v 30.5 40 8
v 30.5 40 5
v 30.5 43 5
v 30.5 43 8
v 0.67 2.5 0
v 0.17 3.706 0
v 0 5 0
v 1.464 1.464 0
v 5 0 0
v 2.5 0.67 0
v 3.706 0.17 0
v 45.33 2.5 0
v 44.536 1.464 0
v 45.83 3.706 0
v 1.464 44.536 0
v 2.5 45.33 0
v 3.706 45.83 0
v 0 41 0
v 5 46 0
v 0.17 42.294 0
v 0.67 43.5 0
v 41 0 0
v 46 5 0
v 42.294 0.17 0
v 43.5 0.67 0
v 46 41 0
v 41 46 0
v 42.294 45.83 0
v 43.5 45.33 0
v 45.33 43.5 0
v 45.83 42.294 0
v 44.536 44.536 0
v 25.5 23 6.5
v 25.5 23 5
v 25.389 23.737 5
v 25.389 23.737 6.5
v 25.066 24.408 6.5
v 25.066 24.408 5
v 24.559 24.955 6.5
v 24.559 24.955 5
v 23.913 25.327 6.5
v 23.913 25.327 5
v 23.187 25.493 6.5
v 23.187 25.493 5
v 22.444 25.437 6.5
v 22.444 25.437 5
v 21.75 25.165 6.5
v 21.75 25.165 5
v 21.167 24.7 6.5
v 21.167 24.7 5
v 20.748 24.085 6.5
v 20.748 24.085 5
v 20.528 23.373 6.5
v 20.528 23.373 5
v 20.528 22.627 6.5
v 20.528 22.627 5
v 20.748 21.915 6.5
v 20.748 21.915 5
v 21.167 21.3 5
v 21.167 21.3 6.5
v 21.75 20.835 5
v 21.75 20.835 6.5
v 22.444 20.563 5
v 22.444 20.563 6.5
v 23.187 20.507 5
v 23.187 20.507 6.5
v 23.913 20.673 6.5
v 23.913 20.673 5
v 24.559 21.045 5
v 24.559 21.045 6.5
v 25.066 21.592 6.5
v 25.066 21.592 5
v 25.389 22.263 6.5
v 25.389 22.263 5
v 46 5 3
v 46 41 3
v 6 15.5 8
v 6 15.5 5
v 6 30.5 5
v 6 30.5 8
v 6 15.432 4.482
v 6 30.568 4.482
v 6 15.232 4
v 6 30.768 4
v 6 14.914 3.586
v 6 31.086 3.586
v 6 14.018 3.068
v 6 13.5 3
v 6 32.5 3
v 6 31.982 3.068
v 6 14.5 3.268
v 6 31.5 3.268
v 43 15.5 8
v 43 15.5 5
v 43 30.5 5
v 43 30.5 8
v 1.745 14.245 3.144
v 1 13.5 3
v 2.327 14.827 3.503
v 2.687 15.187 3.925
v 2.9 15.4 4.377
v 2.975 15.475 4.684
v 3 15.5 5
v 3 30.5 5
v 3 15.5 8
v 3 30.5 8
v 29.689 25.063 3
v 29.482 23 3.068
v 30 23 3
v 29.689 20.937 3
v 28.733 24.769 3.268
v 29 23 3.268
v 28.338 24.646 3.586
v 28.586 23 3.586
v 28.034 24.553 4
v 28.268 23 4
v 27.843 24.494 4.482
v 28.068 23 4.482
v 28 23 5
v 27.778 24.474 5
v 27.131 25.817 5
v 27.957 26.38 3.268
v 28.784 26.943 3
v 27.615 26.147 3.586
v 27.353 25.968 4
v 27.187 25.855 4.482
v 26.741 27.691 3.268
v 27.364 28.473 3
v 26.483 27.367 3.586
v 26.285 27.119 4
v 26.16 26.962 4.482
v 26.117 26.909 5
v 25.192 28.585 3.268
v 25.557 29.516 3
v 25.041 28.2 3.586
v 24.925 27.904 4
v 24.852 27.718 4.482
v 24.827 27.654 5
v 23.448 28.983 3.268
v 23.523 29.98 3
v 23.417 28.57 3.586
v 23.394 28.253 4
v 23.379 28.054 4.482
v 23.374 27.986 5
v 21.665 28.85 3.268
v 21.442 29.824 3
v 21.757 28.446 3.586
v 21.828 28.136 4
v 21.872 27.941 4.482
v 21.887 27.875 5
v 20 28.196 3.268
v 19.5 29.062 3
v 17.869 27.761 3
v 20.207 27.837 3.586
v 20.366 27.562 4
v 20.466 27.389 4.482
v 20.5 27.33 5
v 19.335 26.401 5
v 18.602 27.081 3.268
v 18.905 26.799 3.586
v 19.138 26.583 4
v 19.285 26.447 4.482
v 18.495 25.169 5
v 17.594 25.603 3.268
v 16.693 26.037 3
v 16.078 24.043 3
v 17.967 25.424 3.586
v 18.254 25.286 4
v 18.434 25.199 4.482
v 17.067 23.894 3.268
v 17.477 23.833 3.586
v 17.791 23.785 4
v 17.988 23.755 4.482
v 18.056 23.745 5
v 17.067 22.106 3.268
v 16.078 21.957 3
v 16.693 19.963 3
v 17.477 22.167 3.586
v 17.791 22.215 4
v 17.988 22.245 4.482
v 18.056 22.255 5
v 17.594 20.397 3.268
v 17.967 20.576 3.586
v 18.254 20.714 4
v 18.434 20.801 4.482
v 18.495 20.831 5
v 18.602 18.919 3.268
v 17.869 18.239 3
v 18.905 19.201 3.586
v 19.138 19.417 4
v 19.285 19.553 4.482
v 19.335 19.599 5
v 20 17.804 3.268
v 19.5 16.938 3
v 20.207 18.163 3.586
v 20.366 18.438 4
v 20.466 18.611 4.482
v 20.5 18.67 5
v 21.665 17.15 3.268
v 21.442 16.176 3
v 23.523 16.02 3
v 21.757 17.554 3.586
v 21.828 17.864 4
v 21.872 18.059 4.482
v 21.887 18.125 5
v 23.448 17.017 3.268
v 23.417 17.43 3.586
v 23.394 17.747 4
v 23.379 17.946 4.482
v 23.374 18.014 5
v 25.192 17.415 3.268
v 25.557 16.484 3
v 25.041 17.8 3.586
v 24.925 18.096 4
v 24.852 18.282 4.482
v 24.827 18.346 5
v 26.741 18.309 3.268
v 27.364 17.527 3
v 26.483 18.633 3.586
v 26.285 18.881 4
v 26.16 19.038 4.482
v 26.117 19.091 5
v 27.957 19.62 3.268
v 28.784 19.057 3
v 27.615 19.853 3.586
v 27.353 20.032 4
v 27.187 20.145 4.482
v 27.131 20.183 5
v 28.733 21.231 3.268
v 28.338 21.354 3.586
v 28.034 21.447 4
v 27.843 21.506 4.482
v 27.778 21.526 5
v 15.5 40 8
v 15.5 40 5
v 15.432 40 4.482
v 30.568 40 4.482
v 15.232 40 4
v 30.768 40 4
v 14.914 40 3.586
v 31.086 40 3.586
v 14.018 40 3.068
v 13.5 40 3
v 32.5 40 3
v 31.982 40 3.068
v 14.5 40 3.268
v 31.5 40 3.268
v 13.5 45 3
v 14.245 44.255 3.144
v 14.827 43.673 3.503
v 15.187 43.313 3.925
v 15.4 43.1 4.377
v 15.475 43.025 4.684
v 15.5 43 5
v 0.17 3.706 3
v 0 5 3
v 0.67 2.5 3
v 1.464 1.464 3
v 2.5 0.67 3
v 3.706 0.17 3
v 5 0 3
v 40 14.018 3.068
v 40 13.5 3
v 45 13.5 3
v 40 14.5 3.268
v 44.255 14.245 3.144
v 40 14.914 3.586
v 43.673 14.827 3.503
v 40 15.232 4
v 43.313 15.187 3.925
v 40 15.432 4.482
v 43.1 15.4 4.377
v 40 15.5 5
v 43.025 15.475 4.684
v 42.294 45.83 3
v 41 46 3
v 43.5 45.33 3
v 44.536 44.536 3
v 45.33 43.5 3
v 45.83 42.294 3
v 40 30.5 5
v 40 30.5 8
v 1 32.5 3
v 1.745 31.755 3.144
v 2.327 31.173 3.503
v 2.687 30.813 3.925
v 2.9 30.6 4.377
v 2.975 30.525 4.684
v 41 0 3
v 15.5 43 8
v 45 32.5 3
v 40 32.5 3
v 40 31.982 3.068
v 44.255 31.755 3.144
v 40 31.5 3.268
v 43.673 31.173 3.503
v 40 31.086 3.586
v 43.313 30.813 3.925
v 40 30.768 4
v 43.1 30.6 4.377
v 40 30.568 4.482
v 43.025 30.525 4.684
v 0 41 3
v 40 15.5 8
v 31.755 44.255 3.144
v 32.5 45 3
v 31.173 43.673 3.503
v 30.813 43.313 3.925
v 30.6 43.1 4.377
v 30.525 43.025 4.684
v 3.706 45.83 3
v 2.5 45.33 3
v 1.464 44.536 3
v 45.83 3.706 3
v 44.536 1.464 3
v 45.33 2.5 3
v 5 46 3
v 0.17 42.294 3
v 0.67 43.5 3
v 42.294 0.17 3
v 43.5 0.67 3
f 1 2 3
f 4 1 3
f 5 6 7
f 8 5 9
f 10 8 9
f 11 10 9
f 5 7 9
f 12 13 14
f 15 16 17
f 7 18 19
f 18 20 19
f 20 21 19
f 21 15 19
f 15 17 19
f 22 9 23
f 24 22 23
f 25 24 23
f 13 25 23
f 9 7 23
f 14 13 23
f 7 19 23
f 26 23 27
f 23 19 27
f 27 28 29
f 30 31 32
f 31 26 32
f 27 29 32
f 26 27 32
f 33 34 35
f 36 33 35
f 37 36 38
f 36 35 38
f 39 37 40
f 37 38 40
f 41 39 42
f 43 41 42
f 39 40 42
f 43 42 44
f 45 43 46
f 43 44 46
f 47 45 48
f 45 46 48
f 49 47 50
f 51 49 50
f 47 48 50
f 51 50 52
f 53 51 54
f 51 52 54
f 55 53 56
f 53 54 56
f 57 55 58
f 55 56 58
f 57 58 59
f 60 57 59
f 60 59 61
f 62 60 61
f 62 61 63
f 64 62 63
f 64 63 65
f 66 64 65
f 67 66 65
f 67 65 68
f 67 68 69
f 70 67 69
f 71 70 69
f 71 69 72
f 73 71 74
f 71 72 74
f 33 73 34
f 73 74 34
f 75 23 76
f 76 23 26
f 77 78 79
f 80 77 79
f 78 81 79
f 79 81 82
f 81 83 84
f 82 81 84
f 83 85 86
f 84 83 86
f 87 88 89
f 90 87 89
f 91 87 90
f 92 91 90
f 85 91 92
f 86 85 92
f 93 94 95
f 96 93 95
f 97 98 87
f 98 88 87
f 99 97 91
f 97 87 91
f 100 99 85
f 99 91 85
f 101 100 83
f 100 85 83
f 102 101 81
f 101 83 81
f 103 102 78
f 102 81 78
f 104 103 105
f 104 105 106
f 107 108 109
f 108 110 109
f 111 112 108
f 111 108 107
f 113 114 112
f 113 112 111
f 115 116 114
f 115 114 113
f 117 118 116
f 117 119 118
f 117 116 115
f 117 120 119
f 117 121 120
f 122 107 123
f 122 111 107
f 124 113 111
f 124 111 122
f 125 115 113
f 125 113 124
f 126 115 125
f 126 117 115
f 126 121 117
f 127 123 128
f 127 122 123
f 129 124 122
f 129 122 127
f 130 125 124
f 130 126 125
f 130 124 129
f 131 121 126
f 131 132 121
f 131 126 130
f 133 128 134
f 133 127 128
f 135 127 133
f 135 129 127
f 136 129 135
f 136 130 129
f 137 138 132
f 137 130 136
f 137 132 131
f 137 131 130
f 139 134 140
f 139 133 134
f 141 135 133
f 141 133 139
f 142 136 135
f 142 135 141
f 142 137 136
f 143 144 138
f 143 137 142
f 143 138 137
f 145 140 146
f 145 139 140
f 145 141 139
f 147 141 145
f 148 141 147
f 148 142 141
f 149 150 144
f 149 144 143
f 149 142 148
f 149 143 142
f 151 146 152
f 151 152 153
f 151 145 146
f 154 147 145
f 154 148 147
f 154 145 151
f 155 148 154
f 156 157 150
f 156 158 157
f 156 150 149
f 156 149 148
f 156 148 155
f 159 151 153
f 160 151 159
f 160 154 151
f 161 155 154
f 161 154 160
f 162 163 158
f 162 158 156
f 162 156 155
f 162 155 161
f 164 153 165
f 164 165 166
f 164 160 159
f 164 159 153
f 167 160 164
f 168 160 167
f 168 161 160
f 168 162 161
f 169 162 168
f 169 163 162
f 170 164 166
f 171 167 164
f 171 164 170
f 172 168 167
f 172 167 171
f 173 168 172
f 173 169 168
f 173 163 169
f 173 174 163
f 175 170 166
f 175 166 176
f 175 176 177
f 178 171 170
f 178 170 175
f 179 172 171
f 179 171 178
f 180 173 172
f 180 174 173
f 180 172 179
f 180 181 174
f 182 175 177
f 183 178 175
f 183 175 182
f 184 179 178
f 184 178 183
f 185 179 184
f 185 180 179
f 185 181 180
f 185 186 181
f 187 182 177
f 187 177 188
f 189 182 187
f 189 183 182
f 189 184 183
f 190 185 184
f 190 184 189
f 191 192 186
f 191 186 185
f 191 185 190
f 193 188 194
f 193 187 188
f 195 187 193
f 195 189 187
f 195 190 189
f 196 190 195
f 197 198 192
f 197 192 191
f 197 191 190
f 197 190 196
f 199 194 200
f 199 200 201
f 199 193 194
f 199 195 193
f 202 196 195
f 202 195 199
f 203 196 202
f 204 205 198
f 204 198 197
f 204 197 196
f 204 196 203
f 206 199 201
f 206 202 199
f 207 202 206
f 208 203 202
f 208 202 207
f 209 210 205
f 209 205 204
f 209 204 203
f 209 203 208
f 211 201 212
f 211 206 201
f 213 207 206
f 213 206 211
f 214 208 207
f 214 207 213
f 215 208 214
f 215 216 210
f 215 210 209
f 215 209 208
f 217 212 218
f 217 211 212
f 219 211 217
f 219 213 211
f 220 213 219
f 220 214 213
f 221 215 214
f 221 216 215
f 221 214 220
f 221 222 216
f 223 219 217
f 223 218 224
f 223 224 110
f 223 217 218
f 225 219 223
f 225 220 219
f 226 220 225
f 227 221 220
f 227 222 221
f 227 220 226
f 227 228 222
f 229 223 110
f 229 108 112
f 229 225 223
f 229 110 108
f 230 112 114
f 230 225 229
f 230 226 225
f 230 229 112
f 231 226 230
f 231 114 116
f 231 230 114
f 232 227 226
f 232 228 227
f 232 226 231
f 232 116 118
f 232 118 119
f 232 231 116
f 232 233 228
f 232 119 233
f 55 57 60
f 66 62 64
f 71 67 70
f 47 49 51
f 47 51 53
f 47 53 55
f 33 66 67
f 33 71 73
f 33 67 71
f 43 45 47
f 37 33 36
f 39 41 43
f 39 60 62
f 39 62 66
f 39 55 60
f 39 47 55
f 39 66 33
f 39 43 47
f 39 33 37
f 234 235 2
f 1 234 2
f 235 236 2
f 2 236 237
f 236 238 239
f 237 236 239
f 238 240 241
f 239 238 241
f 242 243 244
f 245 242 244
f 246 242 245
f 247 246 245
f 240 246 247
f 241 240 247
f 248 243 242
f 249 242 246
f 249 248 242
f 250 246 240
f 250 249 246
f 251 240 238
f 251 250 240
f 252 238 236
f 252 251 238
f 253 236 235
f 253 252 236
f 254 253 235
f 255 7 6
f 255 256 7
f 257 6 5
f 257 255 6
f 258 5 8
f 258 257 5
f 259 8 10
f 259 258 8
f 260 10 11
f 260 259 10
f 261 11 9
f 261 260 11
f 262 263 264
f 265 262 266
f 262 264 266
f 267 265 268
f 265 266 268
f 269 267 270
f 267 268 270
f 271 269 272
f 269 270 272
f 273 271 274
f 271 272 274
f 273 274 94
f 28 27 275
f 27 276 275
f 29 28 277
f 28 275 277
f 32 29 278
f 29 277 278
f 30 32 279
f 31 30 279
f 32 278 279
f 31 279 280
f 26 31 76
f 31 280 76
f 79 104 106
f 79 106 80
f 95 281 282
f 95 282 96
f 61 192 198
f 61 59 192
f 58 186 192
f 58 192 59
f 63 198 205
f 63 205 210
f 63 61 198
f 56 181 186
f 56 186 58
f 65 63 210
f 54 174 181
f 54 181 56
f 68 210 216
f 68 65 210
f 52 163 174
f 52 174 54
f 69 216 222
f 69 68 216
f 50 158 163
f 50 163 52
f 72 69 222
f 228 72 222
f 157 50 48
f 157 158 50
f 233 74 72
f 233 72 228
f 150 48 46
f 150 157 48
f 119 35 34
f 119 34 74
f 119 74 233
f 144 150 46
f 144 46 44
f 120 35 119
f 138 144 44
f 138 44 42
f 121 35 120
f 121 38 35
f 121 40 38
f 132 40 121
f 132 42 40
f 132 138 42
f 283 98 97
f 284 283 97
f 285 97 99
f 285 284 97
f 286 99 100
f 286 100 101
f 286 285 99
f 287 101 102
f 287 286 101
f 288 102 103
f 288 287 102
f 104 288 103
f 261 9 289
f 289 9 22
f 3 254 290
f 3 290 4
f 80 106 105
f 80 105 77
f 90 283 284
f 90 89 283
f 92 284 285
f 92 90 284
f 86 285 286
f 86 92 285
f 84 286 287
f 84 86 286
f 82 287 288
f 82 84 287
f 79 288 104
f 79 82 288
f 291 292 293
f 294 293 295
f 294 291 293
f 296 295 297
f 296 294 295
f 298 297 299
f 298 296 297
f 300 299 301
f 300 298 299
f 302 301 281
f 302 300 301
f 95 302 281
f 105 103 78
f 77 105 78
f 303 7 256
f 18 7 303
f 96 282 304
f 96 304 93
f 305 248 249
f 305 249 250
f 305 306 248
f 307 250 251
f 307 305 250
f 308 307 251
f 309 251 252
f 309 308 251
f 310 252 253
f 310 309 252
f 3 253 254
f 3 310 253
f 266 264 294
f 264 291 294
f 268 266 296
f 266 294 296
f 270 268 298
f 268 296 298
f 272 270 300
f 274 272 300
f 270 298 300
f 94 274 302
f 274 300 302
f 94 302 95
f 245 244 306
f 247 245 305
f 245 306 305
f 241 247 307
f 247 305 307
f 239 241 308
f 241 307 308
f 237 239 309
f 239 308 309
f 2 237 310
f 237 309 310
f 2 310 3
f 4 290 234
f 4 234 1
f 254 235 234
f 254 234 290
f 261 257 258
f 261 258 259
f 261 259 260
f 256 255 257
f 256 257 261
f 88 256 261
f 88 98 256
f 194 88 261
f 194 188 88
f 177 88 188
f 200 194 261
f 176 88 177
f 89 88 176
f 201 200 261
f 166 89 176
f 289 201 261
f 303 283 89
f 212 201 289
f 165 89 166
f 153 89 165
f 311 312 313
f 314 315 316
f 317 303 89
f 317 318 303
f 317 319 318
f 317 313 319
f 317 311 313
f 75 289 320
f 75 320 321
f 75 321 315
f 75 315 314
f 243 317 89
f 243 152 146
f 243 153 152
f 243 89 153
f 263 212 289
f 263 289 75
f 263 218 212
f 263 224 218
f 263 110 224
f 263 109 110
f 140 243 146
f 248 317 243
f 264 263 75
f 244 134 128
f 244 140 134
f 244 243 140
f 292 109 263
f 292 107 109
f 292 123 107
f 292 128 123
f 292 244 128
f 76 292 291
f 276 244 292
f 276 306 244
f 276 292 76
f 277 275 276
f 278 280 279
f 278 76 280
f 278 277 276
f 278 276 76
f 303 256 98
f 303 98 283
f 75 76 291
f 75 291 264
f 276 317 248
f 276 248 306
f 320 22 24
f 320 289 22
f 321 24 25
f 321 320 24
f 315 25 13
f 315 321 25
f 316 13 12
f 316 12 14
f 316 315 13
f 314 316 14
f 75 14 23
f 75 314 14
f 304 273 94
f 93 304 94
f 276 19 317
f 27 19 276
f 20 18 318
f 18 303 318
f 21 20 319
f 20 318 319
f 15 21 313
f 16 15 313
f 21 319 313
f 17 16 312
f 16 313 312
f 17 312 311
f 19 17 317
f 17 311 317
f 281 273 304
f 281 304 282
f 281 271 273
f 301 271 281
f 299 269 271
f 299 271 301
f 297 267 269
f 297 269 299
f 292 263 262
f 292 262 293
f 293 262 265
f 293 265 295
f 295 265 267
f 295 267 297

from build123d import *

# Parameters (mm, degrees)
SKETCH_1_W      = 46
SKETCH_1_H      = 46
EXTRUDE_1_DEPTH = 3
SKETCH_3_R      = 5
EXTRUDE_2_DEPTH = 2
SKETCH_4_R      = 2.5
EXTRUDE_3_DEPTH = 1.5
FILLET_1_R      = 5
FILLET_2_R      = 2
SKETCH_5_W      = 3
SKETCH_5_H      = 15
SKETCH_5_W_2    = 15
SKETCH_5_H_2    = 3
EXTRUDE_4_DEPTH = 5
FILLET_3_R      = 2


with BuildPart() as part:
    # ｽｹｯﾁ1 → ﾎﾞｽ - 押し出し1 (new body)
    with BuildSketch(Plane.XY):
        with Locations((23, 23)):
            Rectangle(SKETCH_1_W, SKETCH_1_H)
    extrude(amount=EXTRUDE_1_DEPTH)

    # ｽｹｯﾁ3 → ﾎﾞｽ - 押し出し2 (add)
    with BuildSketch(Plane.XY.offset(3)):
        with Locations((23, 23)):
            Circle(SKETCH_3_R)
    extrude(amount=EXTRUDE_2_DEPTH)

    # ｽｹｯﾁ4 → ﾎﾞｽ - 押し出し3 (add)
    with BuildSketch(Plane.XY.offset(5)):
        with Locations((23, 23)):
            Circle(SKETCH_4_R)
    extrude(amount=EXTRUDE_3_DEPTH)

    # ﾌｨﾚｯﾄ1
    fillet_1_edges = [part.edges().sort_by_distance(p)[0] for p in [
        (0, 46, 1.5),
        (46, 46, 1.5),
        (46, 0, 1.5),
        (0, 0, 1.5),
    ]]
    fillet(fillet_1_edges, radius=FILLET_1_R)

    # ﾌｨﾚｯﾄ2
    fillet_2_edges = [part.edges().sort_by_distance(p)[0] for p in [
        (18, 23, 3),
    ]]
    fillet(fillet_2_edges, radius=FILLET_2_R - 0.0001)  # a hair under: the kernel refuses the full size

    # ｽｹｯﾁ5 → ﾎﾞｽ - 押し出し4 (add)
    with BuildSketch(Plane.XY.offset(3)):
        with Locations((4.5, 23)):
            Rectangle(SKETCH_5_W, SKETCH_5_H)
        with Locations((23, 41.5)):
            Rectangle(SKETCH_5_W_2, SKETCH_5_H_2)
        with Locations((41.5, 23)):
            Rectangle(SKETCH_5_W, SKETCH_5_H)
    extrude(amount=EXTRUDE_4_DEPTH)

    # ﾌｨﾚｯﾄ3
    fillet_3_edges = [part.edges().sort_by_distance(p)[0] for p in [
        (4.5, 30.5, 3),
        (3, 23, 3),
        (4.5, 15.5, 3),
        (15.5, 41.5, 3),
        (30.5, 41.5, 3),
        (23, 43, 3),
        (41.5, 15.5, 3),
        (43, 23, 3),
        (41.5, 30.5, 3),
    ]]
    fillet(fillet_3_edges, radius=FILLET_3_R)


solid = part.part
